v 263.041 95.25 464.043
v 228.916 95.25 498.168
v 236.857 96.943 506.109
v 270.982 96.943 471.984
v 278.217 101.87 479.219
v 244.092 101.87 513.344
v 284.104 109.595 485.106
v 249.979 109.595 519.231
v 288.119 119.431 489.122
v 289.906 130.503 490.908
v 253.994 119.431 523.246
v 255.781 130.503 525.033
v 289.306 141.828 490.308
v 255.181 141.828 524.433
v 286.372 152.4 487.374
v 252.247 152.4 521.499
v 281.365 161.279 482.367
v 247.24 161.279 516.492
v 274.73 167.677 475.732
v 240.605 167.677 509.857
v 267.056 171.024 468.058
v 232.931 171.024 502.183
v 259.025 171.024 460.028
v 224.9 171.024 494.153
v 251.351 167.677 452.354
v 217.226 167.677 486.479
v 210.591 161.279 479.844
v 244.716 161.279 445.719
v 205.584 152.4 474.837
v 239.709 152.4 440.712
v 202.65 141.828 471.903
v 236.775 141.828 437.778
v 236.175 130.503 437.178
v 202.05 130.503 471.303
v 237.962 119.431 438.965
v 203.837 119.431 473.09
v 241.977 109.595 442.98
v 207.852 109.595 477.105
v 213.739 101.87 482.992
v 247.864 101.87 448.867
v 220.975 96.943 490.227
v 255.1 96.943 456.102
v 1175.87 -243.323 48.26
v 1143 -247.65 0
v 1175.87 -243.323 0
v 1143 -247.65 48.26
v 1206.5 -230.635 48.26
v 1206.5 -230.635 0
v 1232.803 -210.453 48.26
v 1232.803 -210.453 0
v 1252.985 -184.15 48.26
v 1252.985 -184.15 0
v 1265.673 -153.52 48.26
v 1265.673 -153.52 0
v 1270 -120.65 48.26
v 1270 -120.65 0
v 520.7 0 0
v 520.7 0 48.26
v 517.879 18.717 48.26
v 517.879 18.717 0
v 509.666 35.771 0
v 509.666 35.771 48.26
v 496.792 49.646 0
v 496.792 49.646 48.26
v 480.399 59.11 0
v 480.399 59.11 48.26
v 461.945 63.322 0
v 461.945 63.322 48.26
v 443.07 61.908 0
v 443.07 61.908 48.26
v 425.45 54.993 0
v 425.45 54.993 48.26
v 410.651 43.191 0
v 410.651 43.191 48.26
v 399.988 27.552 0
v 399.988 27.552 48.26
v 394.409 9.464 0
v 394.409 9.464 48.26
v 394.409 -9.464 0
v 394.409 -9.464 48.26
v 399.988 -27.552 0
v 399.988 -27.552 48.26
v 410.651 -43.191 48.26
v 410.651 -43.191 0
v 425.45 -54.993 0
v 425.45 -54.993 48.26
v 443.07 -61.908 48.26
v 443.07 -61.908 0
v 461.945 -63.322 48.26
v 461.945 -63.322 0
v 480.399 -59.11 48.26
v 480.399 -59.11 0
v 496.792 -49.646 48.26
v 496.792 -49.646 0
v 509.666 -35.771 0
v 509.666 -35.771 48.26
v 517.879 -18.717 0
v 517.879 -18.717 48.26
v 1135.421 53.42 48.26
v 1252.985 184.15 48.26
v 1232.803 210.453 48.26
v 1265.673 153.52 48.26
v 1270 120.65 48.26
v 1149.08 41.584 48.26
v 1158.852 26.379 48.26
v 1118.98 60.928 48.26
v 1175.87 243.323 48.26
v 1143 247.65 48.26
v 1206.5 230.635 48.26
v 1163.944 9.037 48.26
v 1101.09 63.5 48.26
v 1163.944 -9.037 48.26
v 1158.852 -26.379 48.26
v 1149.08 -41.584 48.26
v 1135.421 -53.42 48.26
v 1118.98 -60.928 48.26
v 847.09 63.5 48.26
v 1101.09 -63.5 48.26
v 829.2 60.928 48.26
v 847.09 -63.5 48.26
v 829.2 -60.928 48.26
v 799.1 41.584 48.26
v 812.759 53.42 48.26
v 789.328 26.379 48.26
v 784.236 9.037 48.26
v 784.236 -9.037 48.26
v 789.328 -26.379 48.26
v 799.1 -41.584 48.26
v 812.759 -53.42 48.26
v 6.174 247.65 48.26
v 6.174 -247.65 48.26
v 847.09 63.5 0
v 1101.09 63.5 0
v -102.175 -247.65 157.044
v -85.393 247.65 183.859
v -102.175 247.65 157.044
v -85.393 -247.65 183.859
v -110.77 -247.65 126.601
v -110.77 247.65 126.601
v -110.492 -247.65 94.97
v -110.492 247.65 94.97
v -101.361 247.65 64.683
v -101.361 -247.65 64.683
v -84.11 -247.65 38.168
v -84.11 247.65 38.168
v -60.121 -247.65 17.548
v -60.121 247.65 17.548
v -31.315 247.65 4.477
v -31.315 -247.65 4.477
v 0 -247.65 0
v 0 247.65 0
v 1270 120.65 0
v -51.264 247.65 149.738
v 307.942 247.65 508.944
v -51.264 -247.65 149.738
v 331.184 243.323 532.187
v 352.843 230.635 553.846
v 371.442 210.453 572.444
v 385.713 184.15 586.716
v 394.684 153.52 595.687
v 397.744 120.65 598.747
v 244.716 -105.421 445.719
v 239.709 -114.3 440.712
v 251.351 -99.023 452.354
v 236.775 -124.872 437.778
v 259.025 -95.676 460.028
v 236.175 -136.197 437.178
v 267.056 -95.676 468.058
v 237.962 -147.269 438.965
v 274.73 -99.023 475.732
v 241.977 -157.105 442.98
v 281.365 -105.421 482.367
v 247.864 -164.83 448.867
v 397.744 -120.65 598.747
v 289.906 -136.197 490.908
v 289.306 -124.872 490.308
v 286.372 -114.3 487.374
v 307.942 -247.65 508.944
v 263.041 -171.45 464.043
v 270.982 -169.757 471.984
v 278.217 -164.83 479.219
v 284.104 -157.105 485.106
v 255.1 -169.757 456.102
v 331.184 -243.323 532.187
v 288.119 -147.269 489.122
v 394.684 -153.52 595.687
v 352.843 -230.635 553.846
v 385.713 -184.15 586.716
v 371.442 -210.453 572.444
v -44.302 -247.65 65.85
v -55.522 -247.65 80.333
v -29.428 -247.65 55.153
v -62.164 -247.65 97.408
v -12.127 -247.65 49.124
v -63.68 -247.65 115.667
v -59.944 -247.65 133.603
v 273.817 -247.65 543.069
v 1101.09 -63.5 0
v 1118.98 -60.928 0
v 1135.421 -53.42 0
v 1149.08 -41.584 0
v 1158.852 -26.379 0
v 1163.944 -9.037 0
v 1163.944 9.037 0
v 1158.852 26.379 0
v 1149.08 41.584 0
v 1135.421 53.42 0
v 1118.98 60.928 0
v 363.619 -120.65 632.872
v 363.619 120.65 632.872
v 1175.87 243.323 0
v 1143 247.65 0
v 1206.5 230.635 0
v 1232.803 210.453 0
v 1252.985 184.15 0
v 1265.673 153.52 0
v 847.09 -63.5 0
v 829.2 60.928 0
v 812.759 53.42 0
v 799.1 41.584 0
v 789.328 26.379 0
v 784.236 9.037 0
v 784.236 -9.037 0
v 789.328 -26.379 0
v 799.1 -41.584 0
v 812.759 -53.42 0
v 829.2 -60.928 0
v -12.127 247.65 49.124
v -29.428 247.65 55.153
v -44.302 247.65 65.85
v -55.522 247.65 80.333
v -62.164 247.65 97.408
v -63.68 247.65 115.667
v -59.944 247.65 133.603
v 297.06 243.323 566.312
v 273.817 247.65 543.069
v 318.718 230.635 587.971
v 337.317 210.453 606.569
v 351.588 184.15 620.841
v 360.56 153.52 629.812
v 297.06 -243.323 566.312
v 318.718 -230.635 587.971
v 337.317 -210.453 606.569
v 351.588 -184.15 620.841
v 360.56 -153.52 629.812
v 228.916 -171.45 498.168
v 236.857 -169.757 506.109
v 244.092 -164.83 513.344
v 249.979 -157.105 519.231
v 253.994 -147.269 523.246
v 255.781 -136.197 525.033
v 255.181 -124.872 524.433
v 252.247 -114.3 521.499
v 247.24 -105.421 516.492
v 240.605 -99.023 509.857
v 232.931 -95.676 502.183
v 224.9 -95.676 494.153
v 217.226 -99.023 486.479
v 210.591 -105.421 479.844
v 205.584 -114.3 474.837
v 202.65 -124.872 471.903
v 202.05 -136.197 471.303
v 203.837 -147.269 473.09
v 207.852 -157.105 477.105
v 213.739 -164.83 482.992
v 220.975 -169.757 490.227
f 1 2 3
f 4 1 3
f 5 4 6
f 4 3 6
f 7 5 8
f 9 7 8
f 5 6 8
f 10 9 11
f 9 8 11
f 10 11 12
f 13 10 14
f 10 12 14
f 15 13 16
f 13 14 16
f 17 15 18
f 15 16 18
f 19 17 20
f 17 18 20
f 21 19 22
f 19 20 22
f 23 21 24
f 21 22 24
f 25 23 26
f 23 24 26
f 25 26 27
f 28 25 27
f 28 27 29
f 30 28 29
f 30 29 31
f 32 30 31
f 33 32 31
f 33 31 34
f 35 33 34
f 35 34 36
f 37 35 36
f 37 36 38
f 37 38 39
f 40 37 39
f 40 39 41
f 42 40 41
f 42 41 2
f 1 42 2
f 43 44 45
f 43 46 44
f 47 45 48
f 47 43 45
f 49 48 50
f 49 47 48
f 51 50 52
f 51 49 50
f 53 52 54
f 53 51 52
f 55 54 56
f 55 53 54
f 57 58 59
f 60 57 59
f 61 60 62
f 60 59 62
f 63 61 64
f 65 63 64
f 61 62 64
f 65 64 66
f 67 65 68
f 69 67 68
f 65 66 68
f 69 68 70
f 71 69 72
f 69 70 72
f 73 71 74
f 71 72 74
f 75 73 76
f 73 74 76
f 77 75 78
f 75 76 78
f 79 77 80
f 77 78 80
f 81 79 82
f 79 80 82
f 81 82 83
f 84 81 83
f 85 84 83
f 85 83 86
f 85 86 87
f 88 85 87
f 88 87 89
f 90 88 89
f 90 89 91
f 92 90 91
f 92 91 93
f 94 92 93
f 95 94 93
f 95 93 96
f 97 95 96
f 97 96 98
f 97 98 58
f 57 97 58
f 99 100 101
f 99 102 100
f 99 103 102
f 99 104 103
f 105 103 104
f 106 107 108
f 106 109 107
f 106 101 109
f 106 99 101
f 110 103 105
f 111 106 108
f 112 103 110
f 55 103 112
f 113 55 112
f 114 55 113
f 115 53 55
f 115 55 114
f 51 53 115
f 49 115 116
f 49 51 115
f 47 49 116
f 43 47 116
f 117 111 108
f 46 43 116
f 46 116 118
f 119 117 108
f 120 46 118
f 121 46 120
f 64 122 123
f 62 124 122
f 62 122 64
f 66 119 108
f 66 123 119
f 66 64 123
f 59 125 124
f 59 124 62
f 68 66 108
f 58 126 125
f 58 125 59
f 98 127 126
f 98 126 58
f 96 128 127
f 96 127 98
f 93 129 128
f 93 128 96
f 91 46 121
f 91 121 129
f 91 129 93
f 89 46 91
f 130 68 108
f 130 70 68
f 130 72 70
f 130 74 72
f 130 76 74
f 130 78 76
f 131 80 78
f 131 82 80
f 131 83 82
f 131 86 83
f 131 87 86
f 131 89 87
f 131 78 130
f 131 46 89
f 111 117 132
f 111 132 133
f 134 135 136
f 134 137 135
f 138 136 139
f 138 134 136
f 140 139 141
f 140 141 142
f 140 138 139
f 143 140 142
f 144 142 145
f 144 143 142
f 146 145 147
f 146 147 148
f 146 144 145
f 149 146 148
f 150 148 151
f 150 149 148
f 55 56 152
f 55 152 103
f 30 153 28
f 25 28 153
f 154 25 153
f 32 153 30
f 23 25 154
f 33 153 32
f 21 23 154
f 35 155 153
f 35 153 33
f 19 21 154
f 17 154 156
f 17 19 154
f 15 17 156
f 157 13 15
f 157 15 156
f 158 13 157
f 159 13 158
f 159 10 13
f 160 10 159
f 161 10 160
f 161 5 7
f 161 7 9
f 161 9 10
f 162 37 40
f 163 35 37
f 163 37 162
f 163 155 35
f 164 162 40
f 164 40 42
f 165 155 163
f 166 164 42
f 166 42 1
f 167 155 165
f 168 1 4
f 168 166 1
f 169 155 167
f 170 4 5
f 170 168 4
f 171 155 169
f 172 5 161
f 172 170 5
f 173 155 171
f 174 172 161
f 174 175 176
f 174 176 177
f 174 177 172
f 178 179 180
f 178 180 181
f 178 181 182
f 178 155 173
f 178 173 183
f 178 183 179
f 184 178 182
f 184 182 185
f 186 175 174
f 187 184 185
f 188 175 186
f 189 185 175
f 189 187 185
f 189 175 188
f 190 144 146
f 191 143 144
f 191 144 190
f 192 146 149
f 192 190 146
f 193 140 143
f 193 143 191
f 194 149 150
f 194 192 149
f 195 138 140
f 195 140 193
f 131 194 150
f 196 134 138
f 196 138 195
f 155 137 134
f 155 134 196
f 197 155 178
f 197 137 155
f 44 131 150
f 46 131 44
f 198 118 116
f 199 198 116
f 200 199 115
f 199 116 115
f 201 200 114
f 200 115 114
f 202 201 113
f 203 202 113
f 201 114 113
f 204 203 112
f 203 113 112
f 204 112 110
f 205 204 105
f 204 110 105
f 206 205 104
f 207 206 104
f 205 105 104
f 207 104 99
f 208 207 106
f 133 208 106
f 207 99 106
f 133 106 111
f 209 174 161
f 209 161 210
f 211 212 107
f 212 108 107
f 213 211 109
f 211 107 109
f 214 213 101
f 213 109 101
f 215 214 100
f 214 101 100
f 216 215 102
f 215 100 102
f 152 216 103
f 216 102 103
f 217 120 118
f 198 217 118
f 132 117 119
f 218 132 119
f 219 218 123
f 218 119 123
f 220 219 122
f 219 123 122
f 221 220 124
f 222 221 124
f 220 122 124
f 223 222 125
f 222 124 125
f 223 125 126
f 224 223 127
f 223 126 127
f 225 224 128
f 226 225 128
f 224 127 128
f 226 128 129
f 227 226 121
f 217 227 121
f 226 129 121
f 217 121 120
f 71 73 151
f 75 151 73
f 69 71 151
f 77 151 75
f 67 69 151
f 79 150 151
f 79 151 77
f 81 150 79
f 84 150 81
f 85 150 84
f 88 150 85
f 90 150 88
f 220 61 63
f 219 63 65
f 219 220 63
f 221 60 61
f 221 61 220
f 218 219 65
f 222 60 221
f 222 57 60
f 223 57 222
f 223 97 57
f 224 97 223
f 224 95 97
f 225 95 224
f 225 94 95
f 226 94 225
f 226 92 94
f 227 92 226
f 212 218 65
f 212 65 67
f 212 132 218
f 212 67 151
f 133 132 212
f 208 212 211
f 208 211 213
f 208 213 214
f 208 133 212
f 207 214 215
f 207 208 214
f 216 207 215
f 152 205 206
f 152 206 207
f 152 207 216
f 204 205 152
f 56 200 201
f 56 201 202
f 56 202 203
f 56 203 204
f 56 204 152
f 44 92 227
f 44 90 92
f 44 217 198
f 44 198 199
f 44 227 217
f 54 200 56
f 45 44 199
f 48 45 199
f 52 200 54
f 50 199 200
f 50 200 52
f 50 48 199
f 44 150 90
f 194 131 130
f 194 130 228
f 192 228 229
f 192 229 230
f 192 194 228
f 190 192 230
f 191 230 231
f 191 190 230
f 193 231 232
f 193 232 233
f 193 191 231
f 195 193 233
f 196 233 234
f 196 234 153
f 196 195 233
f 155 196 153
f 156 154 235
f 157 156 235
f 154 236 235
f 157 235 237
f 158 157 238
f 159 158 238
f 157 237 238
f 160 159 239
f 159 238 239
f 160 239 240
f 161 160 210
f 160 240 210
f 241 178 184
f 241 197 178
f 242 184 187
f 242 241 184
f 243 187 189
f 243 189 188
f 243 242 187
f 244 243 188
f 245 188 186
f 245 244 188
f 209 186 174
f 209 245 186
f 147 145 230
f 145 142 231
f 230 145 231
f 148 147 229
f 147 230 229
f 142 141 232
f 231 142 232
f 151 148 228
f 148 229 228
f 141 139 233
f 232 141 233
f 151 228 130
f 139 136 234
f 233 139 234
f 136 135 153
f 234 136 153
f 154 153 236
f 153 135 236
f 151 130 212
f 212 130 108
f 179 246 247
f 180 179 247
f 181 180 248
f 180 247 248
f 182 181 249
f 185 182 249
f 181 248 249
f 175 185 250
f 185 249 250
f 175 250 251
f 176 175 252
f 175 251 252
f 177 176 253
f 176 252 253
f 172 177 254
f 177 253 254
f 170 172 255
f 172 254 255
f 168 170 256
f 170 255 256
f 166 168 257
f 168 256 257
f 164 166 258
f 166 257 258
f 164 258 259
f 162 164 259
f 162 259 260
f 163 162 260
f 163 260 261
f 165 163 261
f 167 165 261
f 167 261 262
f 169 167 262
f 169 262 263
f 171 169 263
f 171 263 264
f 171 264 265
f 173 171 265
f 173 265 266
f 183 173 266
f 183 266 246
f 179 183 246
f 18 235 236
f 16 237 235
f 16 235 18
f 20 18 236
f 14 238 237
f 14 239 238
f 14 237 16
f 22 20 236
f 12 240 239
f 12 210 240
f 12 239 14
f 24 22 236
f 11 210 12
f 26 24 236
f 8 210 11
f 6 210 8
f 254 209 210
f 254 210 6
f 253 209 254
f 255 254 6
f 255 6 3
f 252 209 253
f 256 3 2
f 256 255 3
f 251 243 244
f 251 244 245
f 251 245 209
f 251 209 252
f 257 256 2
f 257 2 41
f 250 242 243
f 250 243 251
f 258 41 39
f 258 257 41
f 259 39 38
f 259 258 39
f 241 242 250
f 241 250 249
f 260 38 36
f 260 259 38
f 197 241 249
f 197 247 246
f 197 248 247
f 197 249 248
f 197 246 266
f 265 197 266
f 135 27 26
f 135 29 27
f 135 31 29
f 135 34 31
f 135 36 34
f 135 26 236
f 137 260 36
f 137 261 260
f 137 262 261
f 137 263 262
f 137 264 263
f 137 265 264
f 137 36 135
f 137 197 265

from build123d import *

# Parameters (mm, degrees)
F1_DEPTH = 247.65
F2_R     = 63.5
F2_W     = 254
F2_H     = 127
F3_DEPTH = 48.261
F4_R     = 38.1
F5_DEPTH = 218.44
F6_R     = 127


with BuildPart() as f1:
    # F0 (on Front) → F1 (new body, symmetric)
    with BuildSketch(Plane.XZ):
        with BuildLine():
            ThreePointArc((-85.393344, 183.85906), (-101.36096, 64.6829), (0, 0))
            Line((0, 0), (1270, 0))
            Line((1270, 0), (1270, 48.26))
            Line((1270, 48.26), (6.174015, 48.26))
            ThreePointArc((6.174015, 48.26), (-55.52241, 80.333411), (-51.264285, 149.738173))
            Line((-51.264285, 149.738173), (397.744435, 598.746893))
            Line((397.744435, 598.746893), (363.619462, 632.871866))
            Line((363.619462, 632.871866), (-85.393344, 183.85906))
        make_face()
    extrude(amount=F1_DEPTH, both=True)

    # F2 (on face) → F3 (cut, through all)
    with BuildSketch(Plane.XY.offset(48.26)):
        with Locations((457.2, 0)):
            Circle(F2_R)
        with Locations((974.09, 0)):
            Rectangle(F2_W, F2_H)
        with BuildLine():
            Line((847.09, -63.5), (847.09, 63.5))
            ThreePointArc((847.09, 63.5), (783.59, 0), (847.09, -63.5))
        make_face()
        with BuildLine():
            ThreePointArc((1101.09, -63.5), (1164.59, 0), (1101.09, 63.5))
            Line((1101.09, 63.5), (1101.09, -63.5))
        make_face()
    extrude(amount=-F3_DEPTH, mode=Mode.SUBTRACT)

    # F4 (on face) → F5 (cut)
    with BuildSketch(Plane(origin=(-134.626202, 0, 134.626202), x_dir=(0, -1, 0), z_dir=(-0.707107, 0, 0.707107))):
        with Locations((-133.35, 514.125775)):
            Circle(F4_R)
        with Locations((133.35, 514.125775)):
            Circle(F4_R)
    extrude(amount=-F5_DEPTH, mode=Mode.SUBTRACT)

    # F6
    f6_edges = [f1.edges().sort_by_distance(p)[0] for p in [
        (380.681949, -247.65, 615.809379),
        (380.681949, 247.65, 615.809379),
        (1270, 247.65, 24.13),
        (1270, -247.65, 24.13),
    ]]
    fillet(f6_edges, radius=F6_R)


solid = f1.part
